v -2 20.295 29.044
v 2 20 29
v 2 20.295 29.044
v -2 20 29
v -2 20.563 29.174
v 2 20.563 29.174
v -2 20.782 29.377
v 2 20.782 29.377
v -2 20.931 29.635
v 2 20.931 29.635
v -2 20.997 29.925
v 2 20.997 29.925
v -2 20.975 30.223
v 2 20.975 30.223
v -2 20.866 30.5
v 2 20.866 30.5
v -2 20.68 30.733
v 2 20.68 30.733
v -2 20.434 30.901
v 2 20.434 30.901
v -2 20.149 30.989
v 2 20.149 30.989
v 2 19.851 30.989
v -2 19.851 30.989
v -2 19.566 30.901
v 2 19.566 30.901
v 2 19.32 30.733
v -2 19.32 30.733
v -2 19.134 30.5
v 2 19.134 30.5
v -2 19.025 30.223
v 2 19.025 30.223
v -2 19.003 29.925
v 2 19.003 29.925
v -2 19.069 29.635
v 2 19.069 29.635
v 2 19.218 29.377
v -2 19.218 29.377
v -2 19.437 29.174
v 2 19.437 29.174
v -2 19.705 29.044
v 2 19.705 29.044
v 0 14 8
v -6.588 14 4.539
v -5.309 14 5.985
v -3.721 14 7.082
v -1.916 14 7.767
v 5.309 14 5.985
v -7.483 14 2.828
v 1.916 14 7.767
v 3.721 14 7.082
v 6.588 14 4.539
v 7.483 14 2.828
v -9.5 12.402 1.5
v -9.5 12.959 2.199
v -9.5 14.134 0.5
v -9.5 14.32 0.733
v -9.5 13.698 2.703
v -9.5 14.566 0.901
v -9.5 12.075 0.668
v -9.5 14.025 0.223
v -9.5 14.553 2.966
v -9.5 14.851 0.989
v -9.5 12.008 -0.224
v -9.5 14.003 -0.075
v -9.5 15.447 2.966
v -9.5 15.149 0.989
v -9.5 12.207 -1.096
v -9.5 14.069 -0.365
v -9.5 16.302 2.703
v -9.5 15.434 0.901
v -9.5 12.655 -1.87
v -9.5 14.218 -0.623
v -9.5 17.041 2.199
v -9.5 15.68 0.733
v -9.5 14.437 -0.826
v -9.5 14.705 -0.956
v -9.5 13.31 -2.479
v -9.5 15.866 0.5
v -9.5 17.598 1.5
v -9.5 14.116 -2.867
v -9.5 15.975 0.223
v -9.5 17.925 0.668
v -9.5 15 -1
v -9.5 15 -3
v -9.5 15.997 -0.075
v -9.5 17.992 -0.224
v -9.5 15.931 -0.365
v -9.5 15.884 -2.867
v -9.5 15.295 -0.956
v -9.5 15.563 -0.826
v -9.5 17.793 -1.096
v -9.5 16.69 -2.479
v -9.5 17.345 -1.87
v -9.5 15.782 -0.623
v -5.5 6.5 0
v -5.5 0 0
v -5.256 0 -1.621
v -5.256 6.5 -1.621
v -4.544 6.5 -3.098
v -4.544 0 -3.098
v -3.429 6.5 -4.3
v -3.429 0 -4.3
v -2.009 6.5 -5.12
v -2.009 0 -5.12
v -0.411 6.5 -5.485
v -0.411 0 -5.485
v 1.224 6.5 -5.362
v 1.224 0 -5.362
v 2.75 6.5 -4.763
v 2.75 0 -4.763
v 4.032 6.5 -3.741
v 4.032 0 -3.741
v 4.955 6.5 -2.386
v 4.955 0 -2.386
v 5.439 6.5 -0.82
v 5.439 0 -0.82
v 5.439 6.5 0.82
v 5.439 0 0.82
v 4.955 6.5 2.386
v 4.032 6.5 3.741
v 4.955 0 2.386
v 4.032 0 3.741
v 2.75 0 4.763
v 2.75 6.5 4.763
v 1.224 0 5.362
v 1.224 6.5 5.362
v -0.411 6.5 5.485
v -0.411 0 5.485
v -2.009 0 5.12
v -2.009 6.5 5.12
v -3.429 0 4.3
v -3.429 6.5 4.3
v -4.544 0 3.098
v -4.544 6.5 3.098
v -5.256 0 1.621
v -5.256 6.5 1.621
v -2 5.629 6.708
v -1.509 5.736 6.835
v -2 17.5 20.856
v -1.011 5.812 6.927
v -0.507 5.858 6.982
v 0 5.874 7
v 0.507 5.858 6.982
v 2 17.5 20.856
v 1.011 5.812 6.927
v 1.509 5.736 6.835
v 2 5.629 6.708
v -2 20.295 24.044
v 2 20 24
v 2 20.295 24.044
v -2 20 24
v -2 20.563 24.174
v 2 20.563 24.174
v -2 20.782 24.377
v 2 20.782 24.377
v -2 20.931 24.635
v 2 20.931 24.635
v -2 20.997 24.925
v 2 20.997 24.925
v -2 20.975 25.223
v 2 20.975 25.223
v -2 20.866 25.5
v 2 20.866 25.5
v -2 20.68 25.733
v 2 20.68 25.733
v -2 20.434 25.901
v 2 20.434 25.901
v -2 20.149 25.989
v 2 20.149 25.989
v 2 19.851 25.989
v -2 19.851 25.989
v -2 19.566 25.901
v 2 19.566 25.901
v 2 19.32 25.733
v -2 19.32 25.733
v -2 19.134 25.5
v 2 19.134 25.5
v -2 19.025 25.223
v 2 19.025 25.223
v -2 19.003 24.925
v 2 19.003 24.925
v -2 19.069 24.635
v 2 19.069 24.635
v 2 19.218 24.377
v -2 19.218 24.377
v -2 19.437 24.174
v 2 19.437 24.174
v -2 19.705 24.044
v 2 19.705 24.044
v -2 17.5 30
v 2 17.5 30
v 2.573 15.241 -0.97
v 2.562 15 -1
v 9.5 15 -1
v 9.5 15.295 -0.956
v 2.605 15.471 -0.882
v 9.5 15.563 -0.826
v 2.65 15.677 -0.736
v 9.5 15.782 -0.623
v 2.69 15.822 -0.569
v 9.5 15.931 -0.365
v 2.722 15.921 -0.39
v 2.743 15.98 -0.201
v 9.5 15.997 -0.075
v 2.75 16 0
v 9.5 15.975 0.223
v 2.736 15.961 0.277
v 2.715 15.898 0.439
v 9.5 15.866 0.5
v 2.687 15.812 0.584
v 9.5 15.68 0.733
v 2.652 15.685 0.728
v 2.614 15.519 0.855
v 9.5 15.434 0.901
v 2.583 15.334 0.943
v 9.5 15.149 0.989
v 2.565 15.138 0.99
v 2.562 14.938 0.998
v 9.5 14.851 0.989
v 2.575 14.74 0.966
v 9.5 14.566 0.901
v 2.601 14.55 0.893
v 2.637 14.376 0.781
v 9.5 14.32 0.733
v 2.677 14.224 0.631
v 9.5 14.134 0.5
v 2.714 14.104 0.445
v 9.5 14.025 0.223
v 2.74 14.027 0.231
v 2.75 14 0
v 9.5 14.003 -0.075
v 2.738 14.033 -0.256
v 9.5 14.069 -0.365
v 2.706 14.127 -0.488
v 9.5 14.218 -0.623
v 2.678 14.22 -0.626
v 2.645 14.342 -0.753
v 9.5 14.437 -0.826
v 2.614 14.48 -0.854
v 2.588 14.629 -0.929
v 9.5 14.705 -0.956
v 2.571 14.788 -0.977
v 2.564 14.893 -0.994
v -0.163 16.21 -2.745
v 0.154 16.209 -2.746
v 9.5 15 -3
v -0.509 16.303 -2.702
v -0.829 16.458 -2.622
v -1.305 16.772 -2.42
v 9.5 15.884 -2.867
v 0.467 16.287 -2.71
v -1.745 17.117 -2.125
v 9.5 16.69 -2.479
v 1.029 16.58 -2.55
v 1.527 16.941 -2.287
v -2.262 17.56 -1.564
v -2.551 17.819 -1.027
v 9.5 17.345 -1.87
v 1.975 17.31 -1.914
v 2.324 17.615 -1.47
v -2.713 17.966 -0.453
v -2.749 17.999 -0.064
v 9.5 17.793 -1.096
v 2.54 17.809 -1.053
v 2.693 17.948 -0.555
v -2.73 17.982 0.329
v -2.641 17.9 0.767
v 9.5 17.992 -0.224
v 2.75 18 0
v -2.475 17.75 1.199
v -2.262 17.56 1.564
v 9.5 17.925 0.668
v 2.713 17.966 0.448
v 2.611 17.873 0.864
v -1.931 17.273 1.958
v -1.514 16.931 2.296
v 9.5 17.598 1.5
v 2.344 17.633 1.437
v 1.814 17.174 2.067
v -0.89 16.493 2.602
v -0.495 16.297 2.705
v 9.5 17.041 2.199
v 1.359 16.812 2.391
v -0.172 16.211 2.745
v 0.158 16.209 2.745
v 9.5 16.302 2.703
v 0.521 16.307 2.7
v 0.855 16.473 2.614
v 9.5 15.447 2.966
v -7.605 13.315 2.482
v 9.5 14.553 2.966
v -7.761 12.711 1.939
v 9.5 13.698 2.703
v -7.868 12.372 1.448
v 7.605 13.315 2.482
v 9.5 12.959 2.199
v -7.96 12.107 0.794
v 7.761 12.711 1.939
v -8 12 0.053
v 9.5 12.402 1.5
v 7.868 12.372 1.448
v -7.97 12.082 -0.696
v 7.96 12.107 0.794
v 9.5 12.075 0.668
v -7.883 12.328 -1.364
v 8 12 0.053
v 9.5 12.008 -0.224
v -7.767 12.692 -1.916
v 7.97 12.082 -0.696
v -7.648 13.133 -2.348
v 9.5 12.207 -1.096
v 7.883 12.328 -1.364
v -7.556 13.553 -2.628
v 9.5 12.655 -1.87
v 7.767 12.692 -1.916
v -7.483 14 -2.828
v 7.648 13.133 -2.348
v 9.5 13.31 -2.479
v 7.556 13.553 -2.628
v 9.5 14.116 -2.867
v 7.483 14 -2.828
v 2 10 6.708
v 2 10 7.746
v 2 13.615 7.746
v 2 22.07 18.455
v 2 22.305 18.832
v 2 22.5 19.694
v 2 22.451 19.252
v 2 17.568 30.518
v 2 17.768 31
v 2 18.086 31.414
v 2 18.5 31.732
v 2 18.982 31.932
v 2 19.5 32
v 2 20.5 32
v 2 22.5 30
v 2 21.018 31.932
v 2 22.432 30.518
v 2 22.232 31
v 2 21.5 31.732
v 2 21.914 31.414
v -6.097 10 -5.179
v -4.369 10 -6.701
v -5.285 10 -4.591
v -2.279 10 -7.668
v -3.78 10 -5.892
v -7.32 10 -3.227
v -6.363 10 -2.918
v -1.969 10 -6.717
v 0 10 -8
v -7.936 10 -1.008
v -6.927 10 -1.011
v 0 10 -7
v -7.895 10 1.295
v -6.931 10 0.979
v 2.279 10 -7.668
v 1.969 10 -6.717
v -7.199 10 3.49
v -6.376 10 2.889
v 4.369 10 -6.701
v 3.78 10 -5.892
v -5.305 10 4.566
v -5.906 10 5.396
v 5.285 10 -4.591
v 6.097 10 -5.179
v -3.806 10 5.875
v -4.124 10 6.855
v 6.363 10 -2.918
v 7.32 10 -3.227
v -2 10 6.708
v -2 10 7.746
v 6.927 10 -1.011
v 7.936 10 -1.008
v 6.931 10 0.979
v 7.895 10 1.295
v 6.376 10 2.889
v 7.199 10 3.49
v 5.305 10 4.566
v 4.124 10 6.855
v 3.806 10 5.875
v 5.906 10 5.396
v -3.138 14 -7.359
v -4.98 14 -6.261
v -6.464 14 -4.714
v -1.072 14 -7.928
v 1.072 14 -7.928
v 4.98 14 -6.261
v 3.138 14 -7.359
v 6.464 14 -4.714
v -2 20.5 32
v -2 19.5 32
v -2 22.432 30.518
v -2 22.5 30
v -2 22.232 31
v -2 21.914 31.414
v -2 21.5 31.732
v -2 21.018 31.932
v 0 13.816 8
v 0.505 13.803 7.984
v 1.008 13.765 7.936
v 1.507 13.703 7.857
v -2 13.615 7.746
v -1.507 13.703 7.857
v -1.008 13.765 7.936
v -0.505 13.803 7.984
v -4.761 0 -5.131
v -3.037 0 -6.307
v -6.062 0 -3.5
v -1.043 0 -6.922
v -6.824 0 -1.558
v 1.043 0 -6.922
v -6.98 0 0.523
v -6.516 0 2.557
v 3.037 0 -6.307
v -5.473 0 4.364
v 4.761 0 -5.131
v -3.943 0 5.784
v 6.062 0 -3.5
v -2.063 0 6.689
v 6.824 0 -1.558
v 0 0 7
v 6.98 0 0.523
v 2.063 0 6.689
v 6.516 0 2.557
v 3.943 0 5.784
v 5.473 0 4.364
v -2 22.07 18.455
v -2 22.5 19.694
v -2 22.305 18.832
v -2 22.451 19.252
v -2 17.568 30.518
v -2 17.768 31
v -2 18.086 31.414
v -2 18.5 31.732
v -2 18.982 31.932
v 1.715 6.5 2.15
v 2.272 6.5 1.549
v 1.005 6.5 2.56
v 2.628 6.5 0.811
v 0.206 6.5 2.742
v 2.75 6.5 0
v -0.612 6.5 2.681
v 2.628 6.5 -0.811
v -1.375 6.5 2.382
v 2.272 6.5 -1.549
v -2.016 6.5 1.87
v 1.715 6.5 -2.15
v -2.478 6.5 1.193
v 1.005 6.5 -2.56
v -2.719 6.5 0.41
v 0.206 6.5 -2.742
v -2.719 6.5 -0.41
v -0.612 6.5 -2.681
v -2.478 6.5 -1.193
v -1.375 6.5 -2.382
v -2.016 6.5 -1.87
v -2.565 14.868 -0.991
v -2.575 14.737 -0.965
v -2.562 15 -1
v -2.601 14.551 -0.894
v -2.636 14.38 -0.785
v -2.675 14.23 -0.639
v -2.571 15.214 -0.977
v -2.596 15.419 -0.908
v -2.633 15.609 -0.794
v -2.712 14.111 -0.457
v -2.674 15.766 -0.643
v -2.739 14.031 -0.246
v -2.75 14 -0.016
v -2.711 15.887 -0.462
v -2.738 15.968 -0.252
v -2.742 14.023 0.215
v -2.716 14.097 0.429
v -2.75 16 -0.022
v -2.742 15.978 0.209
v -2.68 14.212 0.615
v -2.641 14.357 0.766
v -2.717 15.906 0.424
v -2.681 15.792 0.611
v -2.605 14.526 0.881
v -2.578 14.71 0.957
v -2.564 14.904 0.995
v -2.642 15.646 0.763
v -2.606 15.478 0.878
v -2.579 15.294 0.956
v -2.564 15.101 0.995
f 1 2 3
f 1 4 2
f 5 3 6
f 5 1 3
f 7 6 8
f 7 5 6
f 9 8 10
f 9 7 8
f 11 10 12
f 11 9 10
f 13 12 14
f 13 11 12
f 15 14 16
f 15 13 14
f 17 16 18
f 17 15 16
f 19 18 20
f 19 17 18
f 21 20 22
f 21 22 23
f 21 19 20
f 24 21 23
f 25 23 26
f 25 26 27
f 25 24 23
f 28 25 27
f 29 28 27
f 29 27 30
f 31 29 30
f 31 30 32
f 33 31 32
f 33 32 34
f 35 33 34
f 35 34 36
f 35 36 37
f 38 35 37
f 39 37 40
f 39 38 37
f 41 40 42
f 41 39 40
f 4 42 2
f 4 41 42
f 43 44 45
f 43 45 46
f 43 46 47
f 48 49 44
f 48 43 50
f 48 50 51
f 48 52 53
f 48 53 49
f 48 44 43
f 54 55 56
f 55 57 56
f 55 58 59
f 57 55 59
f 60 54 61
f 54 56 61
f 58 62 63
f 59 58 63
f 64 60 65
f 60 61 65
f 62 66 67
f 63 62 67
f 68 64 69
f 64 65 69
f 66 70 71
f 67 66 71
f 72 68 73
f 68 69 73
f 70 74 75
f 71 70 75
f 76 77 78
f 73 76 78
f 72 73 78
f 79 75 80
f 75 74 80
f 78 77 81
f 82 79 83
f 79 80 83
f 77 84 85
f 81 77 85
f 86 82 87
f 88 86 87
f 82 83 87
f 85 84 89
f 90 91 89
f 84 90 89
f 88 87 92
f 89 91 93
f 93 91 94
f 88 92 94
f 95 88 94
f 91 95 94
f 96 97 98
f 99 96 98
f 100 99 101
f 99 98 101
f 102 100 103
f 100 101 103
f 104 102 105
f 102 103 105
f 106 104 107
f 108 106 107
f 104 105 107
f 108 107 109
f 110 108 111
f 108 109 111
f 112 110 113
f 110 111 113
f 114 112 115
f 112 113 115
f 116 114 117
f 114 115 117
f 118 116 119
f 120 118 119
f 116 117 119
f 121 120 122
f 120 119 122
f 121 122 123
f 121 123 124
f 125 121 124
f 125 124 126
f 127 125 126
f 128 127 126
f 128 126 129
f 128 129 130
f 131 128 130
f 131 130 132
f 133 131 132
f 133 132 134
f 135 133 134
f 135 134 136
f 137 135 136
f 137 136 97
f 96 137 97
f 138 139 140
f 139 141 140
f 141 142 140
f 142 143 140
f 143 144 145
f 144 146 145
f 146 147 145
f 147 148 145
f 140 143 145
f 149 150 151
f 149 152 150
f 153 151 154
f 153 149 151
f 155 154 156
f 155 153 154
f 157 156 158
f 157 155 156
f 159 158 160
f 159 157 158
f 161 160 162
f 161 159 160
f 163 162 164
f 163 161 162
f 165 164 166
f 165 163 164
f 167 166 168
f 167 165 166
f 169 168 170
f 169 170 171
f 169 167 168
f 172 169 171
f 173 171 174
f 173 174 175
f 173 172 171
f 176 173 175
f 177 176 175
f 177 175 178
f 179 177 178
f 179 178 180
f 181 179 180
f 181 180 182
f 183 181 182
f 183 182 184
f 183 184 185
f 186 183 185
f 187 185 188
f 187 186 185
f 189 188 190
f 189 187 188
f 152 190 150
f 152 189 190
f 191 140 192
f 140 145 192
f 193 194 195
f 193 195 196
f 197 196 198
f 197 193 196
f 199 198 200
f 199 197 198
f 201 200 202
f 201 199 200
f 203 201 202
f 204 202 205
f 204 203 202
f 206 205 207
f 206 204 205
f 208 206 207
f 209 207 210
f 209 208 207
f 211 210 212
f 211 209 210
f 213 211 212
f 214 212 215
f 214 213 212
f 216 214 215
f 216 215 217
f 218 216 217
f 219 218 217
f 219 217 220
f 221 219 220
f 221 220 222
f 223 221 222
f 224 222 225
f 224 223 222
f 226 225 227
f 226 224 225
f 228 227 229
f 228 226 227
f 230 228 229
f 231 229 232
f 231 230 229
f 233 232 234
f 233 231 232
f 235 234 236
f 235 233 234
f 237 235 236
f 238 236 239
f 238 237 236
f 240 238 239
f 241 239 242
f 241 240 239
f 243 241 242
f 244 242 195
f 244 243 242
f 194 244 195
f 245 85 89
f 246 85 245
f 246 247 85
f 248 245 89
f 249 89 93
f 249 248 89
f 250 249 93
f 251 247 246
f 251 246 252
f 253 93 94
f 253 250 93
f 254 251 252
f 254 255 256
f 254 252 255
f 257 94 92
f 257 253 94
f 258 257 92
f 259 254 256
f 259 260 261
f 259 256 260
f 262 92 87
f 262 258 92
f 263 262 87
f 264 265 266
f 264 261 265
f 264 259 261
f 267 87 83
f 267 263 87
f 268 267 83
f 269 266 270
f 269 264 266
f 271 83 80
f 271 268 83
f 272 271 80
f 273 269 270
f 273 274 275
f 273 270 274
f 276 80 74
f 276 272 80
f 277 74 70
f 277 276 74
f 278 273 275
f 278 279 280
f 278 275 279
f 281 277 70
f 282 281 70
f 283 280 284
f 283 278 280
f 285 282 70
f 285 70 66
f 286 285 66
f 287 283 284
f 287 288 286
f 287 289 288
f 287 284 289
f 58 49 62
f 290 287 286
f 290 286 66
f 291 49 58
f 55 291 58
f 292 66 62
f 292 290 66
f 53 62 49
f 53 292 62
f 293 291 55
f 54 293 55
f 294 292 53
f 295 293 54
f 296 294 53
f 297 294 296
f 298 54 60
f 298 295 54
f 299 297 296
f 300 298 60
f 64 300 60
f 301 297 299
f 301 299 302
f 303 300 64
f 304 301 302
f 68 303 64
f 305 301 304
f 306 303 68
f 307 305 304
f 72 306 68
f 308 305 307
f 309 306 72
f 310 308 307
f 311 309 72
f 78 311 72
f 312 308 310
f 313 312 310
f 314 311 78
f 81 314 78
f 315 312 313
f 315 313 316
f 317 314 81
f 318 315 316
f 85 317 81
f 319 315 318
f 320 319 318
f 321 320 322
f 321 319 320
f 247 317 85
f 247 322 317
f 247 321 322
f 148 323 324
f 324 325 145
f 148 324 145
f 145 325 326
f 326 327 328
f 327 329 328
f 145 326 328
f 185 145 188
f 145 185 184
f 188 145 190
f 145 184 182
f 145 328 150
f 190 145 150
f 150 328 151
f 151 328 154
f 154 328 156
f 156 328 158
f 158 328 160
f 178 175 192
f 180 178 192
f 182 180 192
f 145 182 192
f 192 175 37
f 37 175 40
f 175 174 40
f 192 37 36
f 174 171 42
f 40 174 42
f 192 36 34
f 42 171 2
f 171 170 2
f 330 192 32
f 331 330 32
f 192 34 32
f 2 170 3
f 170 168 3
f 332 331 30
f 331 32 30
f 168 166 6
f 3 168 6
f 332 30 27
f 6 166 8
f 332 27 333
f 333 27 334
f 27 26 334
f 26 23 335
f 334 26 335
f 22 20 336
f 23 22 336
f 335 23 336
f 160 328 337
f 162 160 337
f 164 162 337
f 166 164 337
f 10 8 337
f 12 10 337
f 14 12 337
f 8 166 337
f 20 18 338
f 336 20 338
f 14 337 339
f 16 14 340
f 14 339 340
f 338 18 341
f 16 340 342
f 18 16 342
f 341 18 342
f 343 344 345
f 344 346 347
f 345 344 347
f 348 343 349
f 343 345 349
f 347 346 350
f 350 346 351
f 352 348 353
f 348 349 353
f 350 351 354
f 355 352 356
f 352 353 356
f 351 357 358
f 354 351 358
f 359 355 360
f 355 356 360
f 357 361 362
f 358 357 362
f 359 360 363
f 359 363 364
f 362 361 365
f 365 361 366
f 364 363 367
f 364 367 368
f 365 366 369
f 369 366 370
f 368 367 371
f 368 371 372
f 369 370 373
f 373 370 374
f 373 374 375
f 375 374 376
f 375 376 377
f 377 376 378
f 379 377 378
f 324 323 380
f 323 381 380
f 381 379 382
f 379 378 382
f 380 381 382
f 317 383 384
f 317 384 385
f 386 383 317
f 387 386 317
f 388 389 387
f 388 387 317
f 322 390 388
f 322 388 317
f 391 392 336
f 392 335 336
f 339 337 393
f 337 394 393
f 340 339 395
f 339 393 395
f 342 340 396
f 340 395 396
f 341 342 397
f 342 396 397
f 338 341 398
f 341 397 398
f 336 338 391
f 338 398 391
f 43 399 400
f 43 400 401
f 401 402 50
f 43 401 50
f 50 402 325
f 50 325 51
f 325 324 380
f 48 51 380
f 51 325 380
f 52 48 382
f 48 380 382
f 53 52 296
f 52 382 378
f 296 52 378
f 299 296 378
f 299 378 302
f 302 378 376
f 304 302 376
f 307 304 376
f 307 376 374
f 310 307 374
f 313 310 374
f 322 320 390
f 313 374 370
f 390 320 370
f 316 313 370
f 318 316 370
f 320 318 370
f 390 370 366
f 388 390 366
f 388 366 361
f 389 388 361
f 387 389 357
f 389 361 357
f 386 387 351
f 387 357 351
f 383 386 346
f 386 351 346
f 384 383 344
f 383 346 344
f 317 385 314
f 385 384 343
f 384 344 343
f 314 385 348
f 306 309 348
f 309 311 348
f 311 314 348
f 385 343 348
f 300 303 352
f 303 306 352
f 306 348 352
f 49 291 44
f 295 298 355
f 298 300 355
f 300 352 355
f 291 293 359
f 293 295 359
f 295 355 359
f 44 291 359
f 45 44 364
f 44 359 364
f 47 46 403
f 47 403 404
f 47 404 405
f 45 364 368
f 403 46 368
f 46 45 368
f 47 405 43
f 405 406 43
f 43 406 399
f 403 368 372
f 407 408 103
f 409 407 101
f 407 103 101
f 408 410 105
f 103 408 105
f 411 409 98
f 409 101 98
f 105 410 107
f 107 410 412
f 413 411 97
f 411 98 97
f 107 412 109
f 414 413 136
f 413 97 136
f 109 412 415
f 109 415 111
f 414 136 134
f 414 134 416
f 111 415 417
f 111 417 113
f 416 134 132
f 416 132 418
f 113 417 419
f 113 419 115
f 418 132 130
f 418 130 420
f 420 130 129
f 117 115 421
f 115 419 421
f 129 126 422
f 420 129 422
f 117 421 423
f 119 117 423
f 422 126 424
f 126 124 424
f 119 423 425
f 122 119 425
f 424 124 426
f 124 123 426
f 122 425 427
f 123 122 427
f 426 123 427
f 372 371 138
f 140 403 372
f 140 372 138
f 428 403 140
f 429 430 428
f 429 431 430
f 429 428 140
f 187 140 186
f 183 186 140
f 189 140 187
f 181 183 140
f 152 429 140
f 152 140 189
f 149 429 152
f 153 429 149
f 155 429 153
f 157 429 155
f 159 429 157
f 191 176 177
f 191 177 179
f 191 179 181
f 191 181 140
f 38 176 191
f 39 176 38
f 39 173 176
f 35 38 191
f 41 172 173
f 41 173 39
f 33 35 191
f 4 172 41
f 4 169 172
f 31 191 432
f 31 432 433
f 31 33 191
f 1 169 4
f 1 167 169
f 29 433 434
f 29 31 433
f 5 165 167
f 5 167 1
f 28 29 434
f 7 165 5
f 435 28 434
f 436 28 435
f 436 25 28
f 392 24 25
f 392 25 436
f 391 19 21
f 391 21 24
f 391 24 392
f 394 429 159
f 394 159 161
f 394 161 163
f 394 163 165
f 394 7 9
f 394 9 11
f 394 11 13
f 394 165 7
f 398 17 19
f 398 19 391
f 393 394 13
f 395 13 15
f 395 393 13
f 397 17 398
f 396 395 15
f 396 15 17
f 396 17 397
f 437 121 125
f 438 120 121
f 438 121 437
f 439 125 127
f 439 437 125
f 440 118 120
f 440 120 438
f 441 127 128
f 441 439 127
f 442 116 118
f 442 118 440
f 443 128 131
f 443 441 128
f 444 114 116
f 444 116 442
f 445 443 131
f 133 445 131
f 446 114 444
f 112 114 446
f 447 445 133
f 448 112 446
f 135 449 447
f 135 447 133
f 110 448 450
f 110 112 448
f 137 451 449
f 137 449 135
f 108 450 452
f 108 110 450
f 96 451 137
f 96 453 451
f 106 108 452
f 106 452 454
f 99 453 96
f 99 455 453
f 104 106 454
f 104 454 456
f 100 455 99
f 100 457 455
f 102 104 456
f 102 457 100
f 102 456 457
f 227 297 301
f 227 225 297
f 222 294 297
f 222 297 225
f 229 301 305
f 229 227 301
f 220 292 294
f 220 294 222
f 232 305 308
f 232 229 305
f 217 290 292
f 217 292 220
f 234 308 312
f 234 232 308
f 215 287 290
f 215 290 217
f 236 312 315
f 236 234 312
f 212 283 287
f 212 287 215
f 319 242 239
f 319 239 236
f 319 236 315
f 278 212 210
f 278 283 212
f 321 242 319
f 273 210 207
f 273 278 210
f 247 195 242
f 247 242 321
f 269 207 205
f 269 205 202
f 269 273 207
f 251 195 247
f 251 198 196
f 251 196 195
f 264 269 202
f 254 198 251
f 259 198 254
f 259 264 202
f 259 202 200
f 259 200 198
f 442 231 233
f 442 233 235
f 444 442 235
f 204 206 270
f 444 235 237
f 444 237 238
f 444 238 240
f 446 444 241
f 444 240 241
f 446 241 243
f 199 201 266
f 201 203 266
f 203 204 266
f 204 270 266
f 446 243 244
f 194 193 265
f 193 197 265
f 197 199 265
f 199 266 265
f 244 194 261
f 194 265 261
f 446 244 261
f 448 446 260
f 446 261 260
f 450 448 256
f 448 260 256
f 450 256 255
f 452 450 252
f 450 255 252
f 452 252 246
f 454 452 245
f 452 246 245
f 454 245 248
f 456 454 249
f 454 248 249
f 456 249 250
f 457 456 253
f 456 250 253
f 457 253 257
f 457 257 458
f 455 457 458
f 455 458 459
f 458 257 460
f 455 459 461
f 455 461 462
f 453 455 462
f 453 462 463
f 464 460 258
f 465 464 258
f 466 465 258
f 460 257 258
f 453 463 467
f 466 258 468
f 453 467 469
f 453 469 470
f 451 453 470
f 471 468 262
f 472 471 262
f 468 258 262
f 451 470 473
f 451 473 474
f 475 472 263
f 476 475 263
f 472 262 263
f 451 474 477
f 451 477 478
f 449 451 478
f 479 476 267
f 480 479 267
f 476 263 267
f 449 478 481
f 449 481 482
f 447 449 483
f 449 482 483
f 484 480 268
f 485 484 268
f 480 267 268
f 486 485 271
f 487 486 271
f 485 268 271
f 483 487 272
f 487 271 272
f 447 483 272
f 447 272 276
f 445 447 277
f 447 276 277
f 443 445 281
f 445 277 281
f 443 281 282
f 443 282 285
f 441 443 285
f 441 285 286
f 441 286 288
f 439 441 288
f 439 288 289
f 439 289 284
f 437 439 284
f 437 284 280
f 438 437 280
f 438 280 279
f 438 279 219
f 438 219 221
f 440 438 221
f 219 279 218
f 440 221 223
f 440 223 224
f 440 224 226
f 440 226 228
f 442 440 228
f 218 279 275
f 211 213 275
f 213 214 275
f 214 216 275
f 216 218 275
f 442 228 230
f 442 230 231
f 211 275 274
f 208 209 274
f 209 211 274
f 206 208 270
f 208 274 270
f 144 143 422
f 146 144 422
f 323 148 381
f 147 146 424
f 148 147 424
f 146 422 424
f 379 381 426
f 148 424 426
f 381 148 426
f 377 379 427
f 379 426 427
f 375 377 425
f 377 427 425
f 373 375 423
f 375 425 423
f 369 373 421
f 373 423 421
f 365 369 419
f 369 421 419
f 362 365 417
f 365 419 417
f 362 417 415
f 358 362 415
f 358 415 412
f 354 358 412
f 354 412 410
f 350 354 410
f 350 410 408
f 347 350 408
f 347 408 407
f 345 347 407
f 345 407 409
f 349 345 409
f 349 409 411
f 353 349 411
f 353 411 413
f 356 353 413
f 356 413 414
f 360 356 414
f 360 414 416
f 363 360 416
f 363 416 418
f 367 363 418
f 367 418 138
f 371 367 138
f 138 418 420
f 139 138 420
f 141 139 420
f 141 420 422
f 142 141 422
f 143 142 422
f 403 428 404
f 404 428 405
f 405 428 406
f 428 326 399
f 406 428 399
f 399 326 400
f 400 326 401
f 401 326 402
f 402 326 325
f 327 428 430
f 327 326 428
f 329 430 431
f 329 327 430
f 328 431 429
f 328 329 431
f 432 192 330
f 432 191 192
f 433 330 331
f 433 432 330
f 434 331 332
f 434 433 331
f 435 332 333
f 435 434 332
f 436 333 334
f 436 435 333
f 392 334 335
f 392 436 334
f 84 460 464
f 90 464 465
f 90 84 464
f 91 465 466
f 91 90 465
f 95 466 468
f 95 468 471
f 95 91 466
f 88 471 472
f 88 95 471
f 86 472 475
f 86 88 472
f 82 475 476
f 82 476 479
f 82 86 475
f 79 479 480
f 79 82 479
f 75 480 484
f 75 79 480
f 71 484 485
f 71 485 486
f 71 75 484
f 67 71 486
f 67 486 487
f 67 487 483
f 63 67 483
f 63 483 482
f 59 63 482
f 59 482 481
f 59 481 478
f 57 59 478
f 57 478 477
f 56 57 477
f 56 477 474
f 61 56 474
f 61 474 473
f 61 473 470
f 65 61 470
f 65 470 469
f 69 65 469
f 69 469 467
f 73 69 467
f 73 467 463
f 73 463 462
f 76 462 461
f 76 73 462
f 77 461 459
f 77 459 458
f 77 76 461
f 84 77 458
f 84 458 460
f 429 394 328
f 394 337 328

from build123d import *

# Parameters (mm, degrees)
SKETCH_1_R                   = 7
EXTRUDE_1_DEPTH              = 10
SKETCH_2_R                   = 8
EXTRUDE_2_DEPTH              = 4
SKETCH_3_R                   = 3
EXTRUDE_3_DEPTH              = 9.5
CUT_EXTRUDE_1_DEPTH          = 28.367864531
CUT_EXTRUDE_1_DEPTH_BACK     = 28.367864531
SKETCH_4_R                   = 1
SKETCH_8_R                   = 1
EXTRUDE_4_DEPTH              = 2
HOLE_WIZARD_M5_1_D           = 5.5
HOLE_WIZARD_M5_1_CBORE_D     = 11
HOLE_WIZARD_M5_1_CBORE_DEPTH = 6.5
FILLET_1_R                   = 2


with BuildPart() as part:
    # 草图1 → 凸台-拉伸1 (new body)
    with BuildSketch(Plane(origin=(0, 0, 0), x_dir=(1, 0, 0), z_dir=(0, 1, 0))):
        with Locations(Location((0, 0, 0), (0, 0, 270))):
            Circle(SKETCH_1_R)
    extrude(amount=EXTRUDE_1_DEPTH)

    # 草图2 → 凸台-拉伸2 (add)
    with BuildSketch(Plane(origin=(0, 10, 0), x_dir=(1, 0, 0), z_dir=(0, 1, 0))):
        with Locations(Location((0, 0, 0), (0, 0, 270))):
            Circle(SKETCH_2_R)
    extrude(amount=EXTRUDE_2_DEPTH)

    # 草图3 → 凸台-拉伸3 (add, symmetric)
    with BuildSketch(Plane(origin=(0, 0, 0), x_dir=(0, 0, -1), z_dir=(1, 0, 0))):
        with Locations((0, 15)):
            Circle(SKETCH_3_R)
    extrude(amount=EXTRUDE_3_DEPTH, both=True)

    # 草图4 → 切除-拉伸1 (cut, two sides: drawn at the far end of the back side and taken through both)
    with BuildSketch(Plane(origin=(9.5, 0, 0), x_dir=(0, 0, -1), z_dir=(1, 0, 0)).offset(-CUT_EXTRUDE_1_DEPTH_BACK)):
        with Locations((0, 15)):
            Circle(SKETCH_4_R)
    extrude(amount=CUT_EXTRUDE_1_DEPTH + CUT_EXTRUDE_1_DEPTH_BACK, mode=Mode.SUBTRACT)

    # 草图8 → 凸台-拉伸4 (add, symmetric)
    with BuildSketch(Plane(origin=(0, 0, 0), x_dir=(0, 0, -1), z_dir=(1, 0, 0))):
        Polygon((0, 0), (-20.85568787, 17.5), (-32, 17.5), (-32, 22.5), (-19, 22.5), (0, 7.5), align=None)
        with Locations((-30, 20)):
            Circle(SKETCH_8_R, mode=Mode.SUBTRACT)
        with Locations((-25, 20)):
            Circle(SKETCH_8_R, mode=Mode.SUBTRACT)
    extrude(amount=EXTRUDE_4_DEPTH, both=True)

    # M5 六角头螺栓的柱形沉头孔1 (through all)
    with Locations(Plane(origin=(0, 0, 0), x_dir=(-1, 0, 0), z_dir=(0, -1, 0))):
        with Locations((0, 0)):
            CounterBoreHole(HOLE_WIZARD_M5_1_D / 2, HOLE_WIZARD_M5_1_CBORE_D / 2, HOLE_WIZARD_M5_1_CBORE_DEPTH)

    # 圆角1
    fillet_1_edges = [part.edges().sort_by_distance(p)[0] for p in [
        (0, 22.5, 19),
        (0, 22.5, 32),
        (0, 17.5, 32),
    ]]
    fillet(fillet_1_edges, radius=FILLET_1_R)


solid = part.part
